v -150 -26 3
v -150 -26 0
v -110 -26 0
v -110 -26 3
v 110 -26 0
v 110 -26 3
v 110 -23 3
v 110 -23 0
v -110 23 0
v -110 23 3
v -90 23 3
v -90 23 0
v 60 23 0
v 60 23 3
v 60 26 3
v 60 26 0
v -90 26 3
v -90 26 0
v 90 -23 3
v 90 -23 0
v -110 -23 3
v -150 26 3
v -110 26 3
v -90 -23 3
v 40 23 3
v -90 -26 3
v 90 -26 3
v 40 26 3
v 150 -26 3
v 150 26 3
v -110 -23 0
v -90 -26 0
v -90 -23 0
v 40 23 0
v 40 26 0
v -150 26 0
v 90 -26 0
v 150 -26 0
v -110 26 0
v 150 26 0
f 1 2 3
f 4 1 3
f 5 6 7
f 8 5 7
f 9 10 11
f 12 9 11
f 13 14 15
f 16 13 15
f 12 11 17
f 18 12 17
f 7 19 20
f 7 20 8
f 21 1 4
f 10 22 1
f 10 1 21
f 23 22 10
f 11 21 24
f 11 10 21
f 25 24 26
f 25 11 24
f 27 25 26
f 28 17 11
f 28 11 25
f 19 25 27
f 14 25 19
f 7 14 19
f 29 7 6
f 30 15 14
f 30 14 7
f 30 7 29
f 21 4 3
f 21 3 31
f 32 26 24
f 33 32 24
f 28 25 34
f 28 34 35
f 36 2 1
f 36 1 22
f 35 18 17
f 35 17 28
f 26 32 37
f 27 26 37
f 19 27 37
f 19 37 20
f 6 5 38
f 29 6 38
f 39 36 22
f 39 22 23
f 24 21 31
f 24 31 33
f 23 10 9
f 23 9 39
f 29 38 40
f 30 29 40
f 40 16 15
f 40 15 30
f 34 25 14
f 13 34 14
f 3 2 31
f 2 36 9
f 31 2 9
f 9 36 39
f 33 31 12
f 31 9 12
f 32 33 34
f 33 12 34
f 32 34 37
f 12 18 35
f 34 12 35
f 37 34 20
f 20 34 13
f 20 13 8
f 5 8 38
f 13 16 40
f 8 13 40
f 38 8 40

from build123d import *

# Parameters (mm, degrees)
SKETCH1_W           = 300
SKETCH1_H           = 52
BOSS_EXTRUDE2_DEPTH = 3
SKETCH2_W           = 20
SKETCH2_H           = 3
CUT_EXTRUDE1_DEPTH  = 10
SKETCH3_W           = 20
SKETCH3_H           = 3
CUT_EXTRUDE4_DEPTH  = 10
SKETCH4_W           = 20
SKETCH4_H           = 3
CUT_EXTRUDE5_DEPTH  = 10


with BuildPart() as part:
    # Sketch1 → Boss-Extrude2 (new body)
    with BuildSketch(Plane.XY):
        Rectangle(SKETCH1_W, SKETCH1_H)
    extrude(amount=BOSS_EXTRUDE2_DEPTH)

    # Sketch2 → Cut-Extrude1 (cut)
    with BuildSketch(Plane.XY.offset(3)):
        with Locations((-100, 24.5)):
            Rectangle(SKETCH2_W, SKETCH2_H)
    extrude(amount=-CUT_EXTRUDE1_DEPTH, mode=Mode.SUBTRACT)

    # Sketch3 → Cut-Extrude4 (cut)
    with BuildSketch(Plane.XY.offset(3)):
        with Locations((-100, -24.5)):
            Rectangle(SKETCH3_W, SKETCH3_H)
        with Locations((100, -24.5)):
            Rectangle(SKETCH3_W, SKETCH3_H)
    extrude(amount=-CUT_EXTRUDE4_DEPTH, mode=Mode.SUBTRACT)

    # Sketch4 → Cut-Extrude5 (cut)
    with BuildSketch(Plane.XY.offset(3)):
        with Locations((50, 24.5)):
            Rectangle(SKETCH4_W, SKETCH4_H)
    extrude(amount=-CUT_EXTRUDE5_DEPTH, mode=Mode.SUBTRACT)


solid = part.part
